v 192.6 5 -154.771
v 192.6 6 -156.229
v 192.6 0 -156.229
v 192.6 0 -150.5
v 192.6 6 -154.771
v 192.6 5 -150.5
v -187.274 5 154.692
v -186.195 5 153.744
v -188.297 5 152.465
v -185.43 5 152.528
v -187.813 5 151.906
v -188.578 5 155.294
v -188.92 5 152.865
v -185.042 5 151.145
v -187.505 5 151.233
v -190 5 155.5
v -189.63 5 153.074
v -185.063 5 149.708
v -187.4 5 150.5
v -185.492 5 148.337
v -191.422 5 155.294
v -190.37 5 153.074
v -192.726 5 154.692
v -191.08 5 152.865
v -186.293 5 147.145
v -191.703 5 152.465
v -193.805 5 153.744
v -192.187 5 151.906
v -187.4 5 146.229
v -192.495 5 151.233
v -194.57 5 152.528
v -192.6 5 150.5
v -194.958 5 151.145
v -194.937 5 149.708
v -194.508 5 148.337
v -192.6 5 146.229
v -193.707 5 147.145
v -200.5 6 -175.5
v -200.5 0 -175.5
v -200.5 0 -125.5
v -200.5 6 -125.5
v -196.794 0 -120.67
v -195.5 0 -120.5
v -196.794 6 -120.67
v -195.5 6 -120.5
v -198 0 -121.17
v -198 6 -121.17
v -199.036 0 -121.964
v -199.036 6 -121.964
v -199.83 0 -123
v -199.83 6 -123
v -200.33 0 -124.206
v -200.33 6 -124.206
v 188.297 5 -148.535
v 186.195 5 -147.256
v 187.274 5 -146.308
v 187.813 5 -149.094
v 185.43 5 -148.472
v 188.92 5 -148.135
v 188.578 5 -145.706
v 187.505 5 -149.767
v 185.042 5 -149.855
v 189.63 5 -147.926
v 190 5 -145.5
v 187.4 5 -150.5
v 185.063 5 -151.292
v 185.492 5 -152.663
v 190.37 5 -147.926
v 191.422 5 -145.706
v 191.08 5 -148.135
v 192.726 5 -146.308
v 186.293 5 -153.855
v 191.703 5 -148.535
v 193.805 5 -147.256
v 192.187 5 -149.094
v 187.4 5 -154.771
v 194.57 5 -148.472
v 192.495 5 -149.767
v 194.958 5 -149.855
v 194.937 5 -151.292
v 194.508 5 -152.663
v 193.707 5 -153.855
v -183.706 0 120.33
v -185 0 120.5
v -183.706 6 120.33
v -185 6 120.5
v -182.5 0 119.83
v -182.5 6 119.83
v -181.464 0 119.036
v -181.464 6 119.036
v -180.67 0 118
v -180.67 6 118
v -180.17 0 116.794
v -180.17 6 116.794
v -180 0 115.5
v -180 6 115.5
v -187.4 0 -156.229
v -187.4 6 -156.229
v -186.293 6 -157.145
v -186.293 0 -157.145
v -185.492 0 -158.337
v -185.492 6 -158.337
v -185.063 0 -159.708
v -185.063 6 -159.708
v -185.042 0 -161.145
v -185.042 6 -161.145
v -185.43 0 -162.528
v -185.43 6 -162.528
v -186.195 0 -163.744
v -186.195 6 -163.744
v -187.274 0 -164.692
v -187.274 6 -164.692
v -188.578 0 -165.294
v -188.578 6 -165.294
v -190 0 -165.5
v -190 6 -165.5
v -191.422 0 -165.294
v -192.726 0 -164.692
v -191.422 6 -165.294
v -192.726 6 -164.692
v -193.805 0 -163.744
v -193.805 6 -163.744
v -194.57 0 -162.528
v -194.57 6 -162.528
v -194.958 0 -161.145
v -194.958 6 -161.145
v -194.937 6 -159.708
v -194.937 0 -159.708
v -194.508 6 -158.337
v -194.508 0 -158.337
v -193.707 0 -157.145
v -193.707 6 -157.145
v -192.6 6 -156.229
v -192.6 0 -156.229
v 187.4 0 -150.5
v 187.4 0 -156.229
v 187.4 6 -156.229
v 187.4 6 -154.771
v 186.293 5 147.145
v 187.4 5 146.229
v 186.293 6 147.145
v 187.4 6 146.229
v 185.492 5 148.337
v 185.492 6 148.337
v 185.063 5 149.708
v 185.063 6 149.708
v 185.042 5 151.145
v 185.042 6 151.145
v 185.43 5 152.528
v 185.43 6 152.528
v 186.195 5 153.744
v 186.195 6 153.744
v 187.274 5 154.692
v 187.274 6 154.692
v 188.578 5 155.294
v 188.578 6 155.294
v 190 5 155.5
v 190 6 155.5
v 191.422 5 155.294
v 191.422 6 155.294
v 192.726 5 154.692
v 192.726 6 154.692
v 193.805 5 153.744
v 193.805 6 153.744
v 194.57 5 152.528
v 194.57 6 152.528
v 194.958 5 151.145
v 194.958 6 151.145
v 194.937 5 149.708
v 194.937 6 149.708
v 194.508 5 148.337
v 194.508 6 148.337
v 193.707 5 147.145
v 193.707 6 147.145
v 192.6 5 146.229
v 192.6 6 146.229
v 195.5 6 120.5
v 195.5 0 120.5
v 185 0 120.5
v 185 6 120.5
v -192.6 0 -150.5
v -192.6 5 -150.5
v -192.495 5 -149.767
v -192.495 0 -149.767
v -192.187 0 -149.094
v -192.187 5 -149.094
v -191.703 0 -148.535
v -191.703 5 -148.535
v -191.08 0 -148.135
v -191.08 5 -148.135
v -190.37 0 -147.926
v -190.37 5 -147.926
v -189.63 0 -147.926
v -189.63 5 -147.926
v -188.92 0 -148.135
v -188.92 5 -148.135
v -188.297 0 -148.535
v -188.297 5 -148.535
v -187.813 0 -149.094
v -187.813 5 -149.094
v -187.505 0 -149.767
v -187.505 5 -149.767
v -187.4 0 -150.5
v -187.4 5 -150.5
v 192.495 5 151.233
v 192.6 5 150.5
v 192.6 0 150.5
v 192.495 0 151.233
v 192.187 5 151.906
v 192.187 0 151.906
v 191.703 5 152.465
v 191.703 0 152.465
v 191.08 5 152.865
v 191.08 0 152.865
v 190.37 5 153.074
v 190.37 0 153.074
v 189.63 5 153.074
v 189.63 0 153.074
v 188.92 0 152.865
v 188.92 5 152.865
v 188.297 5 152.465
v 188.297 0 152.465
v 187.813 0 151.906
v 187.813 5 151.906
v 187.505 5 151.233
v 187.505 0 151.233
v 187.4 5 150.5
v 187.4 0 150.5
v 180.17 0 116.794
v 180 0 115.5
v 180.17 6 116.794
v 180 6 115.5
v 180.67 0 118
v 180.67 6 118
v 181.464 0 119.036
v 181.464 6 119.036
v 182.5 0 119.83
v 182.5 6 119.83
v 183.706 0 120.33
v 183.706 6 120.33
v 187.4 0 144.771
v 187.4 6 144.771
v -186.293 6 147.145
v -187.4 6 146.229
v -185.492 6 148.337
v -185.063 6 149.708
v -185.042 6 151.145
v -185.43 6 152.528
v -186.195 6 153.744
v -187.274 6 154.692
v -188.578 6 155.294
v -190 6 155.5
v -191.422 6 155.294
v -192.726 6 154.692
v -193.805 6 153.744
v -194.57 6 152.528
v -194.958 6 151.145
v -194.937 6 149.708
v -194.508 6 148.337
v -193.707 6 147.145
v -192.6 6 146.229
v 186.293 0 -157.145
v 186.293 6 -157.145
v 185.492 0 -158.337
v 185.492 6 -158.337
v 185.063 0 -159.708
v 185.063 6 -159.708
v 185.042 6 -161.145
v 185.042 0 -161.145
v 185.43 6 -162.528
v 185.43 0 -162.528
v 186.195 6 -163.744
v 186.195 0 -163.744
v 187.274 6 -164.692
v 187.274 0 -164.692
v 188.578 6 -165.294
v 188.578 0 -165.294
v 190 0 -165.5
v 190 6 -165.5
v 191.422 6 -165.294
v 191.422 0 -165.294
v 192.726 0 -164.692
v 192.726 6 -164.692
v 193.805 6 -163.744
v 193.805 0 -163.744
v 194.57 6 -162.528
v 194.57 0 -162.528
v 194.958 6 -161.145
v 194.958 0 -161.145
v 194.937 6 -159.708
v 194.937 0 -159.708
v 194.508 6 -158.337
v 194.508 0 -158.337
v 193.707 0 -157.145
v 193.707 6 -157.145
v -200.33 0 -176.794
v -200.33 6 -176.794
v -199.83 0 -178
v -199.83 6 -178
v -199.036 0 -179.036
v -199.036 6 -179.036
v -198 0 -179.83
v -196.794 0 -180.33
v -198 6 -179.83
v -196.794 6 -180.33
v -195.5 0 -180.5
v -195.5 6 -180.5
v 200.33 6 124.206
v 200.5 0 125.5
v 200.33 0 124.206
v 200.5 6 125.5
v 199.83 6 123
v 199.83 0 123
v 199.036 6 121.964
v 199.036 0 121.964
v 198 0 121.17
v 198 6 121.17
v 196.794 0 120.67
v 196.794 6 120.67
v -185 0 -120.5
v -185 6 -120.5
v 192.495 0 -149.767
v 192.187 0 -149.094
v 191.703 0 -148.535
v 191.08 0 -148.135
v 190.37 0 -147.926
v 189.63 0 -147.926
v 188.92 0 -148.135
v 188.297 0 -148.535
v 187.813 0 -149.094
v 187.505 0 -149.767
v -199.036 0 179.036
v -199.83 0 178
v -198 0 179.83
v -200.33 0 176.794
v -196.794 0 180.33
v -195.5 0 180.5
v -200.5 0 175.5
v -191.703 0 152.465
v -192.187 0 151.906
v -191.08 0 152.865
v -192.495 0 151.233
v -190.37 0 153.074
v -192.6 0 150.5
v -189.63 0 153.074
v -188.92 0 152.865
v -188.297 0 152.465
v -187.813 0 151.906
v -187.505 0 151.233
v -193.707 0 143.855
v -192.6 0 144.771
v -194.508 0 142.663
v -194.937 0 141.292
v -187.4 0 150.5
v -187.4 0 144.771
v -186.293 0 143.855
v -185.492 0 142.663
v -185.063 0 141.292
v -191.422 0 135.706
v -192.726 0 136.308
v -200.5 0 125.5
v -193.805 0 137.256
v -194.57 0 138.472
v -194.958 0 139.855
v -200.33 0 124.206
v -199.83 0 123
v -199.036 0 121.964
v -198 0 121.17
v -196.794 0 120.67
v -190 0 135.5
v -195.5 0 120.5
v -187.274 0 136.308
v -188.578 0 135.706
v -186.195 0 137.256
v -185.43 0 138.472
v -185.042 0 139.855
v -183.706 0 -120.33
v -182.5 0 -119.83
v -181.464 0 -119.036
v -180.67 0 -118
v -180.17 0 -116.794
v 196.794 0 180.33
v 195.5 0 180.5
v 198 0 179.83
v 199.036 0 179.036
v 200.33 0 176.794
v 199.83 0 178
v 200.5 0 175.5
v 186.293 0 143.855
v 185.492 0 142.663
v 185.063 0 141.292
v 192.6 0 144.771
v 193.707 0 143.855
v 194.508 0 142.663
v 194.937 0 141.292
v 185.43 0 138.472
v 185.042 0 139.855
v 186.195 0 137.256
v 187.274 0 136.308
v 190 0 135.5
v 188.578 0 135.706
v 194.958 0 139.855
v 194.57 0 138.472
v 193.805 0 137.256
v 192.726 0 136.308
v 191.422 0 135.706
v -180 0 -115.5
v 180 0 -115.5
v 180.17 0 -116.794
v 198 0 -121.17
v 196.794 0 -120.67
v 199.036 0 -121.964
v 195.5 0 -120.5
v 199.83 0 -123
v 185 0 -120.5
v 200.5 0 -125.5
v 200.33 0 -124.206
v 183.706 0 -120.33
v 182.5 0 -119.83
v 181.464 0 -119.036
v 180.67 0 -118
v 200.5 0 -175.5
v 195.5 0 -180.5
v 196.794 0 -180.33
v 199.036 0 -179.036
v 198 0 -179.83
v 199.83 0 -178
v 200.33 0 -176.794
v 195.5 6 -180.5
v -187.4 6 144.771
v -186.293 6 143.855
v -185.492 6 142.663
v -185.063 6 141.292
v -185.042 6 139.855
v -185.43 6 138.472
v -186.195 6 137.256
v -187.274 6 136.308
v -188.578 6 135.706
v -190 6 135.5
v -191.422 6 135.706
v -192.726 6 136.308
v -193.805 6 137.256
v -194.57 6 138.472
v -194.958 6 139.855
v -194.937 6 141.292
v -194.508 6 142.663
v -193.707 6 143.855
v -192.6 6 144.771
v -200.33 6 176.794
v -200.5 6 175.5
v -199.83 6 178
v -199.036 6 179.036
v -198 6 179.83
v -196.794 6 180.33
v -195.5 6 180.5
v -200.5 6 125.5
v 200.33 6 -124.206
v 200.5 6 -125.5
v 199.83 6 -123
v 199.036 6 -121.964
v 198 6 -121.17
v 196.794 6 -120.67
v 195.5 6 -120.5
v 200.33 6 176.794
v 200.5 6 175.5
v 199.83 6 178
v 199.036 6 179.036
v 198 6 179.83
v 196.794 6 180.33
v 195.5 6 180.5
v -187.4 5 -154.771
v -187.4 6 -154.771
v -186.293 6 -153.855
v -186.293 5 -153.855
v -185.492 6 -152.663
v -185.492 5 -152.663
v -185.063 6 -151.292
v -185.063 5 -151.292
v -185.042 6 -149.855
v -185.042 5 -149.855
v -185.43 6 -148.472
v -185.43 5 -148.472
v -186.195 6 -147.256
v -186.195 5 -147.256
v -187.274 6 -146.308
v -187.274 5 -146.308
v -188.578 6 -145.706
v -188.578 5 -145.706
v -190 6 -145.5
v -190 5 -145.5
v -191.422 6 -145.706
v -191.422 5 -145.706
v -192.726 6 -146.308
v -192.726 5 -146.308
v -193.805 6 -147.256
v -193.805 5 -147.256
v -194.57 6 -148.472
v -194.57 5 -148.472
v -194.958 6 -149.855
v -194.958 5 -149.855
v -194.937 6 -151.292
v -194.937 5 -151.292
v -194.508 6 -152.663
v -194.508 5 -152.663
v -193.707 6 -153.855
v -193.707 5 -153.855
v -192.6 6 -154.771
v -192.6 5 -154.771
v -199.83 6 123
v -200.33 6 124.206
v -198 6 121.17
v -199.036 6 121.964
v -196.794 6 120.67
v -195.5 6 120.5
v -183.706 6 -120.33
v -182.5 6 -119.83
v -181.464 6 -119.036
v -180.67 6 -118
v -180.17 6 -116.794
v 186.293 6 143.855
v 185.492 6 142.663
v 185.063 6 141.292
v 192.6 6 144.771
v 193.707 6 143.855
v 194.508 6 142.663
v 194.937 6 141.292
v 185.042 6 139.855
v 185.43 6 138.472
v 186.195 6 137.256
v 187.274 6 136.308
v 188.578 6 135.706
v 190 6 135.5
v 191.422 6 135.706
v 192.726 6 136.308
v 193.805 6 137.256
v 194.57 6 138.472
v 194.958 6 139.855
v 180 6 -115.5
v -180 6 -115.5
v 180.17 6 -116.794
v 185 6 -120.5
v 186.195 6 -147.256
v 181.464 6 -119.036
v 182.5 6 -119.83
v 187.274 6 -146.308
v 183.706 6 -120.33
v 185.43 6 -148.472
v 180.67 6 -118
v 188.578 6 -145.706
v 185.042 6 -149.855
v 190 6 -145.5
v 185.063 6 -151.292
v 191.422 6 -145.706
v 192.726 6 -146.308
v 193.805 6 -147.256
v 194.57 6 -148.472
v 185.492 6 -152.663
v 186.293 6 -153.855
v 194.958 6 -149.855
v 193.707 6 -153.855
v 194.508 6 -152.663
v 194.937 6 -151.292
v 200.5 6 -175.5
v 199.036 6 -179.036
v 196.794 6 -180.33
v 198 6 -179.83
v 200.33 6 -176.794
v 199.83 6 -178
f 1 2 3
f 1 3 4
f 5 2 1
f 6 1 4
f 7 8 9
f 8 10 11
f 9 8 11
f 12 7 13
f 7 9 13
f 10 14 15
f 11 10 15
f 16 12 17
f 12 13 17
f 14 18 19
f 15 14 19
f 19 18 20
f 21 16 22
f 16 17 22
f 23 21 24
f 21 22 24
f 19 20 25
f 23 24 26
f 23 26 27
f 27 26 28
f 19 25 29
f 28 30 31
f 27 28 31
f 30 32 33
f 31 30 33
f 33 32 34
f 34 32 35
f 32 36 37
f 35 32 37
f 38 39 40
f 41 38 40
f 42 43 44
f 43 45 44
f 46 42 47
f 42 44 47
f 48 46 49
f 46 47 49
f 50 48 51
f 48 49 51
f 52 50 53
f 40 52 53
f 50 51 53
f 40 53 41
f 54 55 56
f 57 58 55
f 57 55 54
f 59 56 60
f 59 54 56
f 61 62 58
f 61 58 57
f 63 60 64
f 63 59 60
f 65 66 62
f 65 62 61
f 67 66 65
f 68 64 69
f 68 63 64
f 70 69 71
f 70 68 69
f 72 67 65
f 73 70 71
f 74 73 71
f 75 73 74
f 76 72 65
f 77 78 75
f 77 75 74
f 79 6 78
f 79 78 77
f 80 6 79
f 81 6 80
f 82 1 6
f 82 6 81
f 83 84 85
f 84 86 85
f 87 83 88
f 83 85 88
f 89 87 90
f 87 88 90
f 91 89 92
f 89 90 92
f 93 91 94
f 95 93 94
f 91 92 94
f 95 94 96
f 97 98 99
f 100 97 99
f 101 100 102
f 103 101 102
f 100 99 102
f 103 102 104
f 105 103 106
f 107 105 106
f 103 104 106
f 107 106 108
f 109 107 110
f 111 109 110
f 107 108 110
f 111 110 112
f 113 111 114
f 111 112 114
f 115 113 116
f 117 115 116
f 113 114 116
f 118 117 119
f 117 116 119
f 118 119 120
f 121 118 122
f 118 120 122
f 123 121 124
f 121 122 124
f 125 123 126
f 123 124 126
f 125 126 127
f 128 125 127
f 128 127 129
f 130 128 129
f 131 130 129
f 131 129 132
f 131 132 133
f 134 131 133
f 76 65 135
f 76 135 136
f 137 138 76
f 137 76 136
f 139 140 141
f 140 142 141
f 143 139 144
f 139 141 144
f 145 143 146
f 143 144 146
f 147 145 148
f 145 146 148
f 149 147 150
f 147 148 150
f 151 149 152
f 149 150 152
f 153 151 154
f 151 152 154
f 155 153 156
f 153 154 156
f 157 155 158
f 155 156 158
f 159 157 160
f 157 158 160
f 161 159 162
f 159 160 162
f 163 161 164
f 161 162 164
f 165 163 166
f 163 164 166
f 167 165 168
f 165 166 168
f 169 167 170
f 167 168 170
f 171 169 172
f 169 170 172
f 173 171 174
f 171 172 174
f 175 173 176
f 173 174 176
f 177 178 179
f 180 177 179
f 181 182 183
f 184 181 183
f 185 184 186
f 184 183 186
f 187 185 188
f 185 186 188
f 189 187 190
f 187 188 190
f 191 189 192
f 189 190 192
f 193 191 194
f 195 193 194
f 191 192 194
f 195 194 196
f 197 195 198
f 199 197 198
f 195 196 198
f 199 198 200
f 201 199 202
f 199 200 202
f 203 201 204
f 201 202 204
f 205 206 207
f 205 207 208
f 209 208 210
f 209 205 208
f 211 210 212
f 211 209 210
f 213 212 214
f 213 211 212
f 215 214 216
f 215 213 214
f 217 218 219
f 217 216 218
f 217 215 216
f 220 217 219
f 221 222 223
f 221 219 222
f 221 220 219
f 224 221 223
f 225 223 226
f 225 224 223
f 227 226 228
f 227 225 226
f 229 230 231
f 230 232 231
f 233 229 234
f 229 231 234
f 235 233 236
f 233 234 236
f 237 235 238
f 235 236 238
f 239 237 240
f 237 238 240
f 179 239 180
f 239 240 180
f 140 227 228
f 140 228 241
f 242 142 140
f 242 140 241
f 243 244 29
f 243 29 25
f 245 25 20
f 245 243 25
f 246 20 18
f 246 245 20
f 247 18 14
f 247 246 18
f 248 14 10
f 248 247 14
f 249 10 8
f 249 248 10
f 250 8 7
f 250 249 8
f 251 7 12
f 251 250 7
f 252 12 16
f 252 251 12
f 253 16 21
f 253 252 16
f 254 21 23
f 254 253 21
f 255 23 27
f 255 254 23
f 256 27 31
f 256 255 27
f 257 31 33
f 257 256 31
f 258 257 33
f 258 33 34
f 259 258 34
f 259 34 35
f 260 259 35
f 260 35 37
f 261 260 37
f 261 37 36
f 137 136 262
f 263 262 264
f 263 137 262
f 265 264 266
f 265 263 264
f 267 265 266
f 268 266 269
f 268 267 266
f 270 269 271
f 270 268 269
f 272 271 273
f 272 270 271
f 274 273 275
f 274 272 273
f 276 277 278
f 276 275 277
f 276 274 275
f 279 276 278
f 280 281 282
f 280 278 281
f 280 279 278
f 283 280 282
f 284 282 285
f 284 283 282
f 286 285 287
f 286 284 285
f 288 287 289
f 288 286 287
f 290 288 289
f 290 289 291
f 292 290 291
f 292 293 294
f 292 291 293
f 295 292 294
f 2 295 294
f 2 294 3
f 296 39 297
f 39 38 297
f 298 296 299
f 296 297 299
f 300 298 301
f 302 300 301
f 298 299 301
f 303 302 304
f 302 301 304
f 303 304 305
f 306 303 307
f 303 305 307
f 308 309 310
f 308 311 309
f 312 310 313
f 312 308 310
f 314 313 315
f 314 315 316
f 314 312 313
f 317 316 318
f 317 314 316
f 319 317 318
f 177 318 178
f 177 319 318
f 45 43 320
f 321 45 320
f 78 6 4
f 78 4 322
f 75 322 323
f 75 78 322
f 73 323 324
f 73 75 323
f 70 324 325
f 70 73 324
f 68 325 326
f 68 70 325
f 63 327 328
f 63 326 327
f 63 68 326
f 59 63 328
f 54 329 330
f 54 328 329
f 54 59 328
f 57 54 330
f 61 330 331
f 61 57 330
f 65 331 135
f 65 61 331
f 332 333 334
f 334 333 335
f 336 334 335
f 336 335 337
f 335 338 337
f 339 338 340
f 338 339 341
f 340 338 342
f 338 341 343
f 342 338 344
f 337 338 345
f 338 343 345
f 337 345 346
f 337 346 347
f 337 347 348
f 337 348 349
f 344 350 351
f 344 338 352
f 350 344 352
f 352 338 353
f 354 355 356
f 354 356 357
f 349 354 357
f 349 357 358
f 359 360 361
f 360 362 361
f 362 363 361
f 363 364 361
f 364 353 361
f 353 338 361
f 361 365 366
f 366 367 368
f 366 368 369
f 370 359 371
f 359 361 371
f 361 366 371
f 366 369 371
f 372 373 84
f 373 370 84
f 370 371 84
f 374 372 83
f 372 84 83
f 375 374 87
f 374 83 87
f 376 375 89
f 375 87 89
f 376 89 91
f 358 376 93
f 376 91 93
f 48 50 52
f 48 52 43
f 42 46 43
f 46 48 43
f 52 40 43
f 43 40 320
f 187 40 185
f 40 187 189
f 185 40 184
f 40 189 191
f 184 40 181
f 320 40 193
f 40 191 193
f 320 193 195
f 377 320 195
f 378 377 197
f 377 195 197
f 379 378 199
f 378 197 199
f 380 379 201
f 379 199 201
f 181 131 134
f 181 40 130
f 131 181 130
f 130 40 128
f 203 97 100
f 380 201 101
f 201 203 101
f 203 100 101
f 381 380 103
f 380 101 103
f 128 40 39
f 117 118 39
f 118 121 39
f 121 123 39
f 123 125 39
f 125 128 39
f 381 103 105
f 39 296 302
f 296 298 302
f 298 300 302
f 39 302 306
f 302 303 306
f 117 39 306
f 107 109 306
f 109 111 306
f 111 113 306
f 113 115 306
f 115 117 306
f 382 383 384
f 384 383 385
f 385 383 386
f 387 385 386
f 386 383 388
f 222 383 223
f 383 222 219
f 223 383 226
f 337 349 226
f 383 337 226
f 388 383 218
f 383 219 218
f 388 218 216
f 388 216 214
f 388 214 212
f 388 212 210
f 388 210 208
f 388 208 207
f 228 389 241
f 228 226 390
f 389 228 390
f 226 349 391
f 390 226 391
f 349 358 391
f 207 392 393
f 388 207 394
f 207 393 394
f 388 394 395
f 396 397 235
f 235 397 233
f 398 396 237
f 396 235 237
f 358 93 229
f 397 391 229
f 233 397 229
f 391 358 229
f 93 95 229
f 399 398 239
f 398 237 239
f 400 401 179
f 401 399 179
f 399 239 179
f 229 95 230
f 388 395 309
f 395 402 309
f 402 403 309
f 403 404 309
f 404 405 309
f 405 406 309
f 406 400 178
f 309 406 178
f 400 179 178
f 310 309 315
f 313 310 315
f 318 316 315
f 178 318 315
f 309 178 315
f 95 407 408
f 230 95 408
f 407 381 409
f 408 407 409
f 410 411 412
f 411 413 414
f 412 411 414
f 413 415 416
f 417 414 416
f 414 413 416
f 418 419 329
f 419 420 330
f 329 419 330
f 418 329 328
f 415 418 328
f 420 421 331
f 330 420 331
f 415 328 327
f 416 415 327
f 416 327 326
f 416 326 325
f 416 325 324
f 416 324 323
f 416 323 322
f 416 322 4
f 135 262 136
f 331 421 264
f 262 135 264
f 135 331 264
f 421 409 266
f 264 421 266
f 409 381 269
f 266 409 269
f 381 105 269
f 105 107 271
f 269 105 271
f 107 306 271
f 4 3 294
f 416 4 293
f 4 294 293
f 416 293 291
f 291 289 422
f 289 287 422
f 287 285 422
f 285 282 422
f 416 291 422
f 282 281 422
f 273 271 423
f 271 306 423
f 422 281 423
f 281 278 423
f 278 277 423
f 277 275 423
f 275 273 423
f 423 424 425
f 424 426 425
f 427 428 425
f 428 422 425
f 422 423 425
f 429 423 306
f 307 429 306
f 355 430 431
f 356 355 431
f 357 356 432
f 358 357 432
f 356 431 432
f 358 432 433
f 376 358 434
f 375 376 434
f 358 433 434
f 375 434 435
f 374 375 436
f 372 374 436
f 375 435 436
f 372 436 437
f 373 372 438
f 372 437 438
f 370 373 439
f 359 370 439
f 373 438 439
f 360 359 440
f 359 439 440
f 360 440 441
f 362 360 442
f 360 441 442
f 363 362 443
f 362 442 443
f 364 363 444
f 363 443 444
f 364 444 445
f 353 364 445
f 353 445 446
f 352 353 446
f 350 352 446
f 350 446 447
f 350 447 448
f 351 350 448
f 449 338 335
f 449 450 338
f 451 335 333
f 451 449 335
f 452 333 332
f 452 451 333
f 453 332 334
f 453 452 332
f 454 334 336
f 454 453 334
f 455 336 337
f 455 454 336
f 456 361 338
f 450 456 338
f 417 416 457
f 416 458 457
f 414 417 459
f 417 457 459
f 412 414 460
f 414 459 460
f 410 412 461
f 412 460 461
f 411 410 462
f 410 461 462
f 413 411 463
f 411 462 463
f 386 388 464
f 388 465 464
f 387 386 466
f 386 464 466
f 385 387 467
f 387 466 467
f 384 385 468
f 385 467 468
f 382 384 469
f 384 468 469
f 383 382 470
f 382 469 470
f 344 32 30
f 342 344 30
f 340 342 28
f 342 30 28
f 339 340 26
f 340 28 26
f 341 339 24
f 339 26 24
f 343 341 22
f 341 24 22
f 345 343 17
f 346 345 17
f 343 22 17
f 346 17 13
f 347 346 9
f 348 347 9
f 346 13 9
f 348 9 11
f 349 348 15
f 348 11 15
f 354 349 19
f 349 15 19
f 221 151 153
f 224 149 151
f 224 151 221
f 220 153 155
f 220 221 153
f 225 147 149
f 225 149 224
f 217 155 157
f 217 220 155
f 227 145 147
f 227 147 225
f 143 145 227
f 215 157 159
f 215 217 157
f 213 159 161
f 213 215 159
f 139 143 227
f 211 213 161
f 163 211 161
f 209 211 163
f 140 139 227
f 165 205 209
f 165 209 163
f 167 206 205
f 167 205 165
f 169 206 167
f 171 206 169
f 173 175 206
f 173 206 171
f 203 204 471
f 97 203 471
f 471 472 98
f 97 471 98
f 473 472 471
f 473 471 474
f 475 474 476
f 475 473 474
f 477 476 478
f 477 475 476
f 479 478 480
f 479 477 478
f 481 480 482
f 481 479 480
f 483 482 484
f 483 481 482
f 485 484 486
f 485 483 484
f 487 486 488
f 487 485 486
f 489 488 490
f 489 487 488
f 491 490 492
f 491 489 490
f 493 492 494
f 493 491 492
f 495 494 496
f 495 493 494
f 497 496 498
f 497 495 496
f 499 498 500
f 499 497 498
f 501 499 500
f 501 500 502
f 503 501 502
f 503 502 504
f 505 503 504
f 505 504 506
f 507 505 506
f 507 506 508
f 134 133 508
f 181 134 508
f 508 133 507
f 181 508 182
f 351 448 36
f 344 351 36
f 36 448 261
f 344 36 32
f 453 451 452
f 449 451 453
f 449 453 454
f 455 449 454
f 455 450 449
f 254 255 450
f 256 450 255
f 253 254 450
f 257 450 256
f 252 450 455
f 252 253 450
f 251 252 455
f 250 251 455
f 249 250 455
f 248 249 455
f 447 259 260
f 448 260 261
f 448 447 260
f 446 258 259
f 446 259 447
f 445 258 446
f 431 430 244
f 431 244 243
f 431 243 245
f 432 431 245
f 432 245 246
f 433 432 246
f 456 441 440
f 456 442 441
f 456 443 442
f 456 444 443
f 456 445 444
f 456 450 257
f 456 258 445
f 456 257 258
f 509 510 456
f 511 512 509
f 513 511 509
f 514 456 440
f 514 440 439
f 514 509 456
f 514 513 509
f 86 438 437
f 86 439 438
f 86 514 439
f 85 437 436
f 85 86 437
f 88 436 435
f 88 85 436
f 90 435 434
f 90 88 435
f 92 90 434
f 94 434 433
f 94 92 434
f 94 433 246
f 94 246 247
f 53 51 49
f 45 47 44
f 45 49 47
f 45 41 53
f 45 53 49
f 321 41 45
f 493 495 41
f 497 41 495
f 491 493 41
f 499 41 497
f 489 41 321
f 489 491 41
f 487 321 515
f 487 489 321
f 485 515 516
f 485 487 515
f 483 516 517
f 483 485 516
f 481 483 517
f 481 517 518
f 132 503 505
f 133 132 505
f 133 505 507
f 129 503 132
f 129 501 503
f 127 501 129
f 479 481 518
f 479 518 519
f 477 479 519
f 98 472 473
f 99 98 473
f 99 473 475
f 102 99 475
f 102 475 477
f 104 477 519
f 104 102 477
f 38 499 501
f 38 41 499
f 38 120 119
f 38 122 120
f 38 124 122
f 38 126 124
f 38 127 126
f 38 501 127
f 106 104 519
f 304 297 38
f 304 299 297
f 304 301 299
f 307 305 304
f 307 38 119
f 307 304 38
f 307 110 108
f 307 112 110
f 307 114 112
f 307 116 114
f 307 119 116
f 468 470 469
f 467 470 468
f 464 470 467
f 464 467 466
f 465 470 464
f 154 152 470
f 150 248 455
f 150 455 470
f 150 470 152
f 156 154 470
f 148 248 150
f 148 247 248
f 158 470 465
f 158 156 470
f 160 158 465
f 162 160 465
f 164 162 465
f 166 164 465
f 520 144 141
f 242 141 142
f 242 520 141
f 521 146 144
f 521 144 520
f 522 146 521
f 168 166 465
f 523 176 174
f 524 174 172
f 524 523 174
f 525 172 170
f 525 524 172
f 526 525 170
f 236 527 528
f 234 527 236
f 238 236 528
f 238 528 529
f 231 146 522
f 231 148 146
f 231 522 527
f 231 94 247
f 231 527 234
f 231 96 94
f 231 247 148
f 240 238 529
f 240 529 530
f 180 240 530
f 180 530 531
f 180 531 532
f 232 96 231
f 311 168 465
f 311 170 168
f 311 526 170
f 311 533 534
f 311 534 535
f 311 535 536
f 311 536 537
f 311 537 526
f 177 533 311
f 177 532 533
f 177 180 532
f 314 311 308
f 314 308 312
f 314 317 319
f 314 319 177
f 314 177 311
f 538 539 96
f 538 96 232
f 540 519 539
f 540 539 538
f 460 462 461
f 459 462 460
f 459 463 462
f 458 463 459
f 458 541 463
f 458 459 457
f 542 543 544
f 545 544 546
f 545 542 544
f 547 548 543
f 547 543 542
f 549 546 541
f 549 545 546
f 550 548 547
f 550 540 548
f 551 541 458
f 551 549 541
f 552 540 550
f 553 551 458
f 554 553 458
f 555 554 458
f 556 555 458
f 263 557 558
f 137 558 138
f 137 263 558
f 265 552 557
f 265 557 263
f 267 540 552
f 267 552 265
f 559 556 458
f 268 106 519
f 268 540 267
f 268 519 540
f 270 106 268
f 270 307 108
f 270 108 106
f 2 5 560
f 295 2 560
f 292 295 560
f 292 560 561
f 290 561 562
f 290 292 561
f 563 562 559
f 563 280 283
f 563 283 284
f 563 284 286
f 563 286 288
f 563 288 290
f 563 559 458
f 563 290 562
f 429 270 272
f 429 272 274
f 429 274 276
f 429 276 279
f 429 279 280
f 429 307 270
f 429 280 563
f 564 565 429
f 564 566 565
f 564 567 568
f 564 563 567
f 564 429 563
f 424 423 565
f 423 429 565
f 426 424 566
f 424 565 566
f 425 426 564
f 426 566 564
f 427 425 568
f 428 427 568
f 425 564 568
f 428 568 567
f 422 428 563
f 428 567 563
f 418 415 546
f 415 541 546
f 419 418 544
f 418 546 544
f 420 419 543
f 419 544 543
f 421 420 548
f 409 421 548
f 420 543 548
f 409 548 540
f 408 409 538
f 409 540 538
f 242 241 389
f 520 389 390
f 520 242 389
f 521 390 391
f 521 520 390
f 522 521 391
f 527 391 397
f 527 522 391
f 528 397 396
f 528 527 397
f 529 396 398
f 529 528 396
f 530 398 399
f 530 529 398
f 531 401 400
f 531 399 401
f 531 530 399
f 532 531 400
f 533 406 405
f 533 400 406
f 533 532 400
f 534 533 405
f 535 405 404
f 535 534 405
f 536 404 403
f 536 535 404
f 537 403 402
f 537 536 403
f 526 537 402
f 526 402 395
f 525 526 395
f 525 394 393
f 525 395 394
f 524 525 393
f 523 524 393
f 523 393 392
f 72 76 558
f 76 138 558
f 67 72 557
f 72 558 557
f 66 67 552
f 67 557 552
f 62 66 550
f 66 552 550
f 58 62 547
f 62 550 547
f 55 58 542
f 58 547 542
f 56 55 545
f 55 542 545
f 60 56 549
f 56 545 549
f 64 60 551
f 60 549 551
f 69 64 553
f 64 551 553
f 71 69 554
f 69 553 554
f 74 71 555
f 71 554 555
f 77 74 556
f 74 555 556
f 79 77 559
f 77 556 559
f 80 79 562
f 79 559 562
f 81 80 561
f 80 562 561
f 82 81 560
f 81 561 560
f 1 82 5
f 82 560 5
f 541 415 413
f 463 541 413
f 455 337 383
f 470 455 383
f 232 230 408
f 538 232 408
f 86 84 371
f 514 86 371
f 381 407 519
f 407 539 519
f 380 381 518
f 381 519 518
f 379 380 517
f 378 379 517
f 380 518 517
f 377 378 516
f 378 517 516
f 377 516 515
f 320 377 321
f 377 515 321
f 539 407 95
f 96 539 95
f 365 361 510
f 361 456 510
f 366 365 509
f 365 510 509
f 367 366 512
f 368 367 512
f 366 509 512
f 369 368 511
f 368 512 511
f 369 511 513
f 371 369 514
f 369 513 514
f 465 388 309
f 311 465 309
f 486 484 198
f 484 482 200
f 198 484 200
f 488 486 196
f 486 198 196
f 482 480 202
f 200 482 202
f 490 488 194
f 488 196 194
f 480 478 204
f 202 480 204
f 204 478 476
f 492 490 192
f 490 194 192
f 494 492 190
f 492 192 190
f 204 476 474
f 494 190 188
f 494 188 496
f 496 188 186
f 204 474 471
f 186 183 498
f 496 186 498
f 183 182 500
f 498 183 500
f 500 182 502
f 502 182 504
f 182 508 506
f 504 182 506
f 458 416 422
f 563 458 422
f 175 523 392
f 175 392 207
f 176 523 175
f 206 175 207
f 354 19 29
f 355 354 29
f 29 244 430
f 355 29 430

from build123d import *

# Parameters (mm, degrees)
BOSS_EXTRUDE1_DEPTH = 6
CUT_EXTRUDE1_DEPTH  = 270.845326067
SKETCH3_R           = 5
CUT_EXTRUDE2_DEPTH  = 1
FILLET1_R           = 5


with BuildPart() as part:
    # Sketch1 → Boss-Extrude1 (new body)
    with BuildSketch(Plane(origin=(0, 0, 0), x_dir=(1, 0, 0), z_dir=(0, 1, 0))):
        Polygon((0, -180.5), (200.5, -180.5), (200.5, -120.5), (180, -120.5), (180, 0), (180, 120.5), (200.5, 120.5), (200.5, 180.5), (0, 180.5), (-200.5, 180.5), (-200.5, 120.5), (-180, 120.5), (-180, 0), (-180, -120.5), (-200.5, -120.5), (-200.5, -180.5), align=None)
    extrude(amount=BOSS_EXTRUDE1_DEPTH)

    # Sketch2 → Cut-Extrude1 (cut, through all)
    with BuildSketch(Plane(origin=(0, 6, 0), x_dir=(1, 0, 0), z_dir=(0, 1, 0))):
        with BuildLine():
            Line((187.4, -150.5), (187.4, -144.770831301))
            ThreePointArc((187.4, -144.770831301), (190, -135.5), (192.6, -144.770831301))
            Line((192.6, -144.770831301), (192.6, -150.5))
            ThreePointArc((192.6, -150.5), (190, -153.1), (187.4, -150.5))
        make_face()
        with BuildLine():
            Line((187.4, 150.5), (187.4, 156.229168699))
            ThreePointArc((187.4, 156.229168699), (190, 165.5), (192.6, 156.229168699))
            Line((192.6, 156.229168699), (192.6, 150.5))
            ThreePointArc((192.6, 150.5), (190, 147.9), (187.4, 150.5))
        make_face()
    cut_extrude1 = extrude(amount=-CUT_EXTRUDE1_DEPTH, mode=Mode.SUBTRACT)

    # Sketch3 → Cut-Extrude2 (cut)
    with BuildSketch(Plane(origin=(0, 6, 0), x_dir=(1, 0, 0), z_dir=(0, 1, 0))):
        with Locations((190, 150.5)):
            Circle(SKETCH3_R)
        with Locations((190, -150.5)):
            Circle(SKETCH3_R)
    cut_extrude2 = extrude(amount=-CUT_EXTRUDE2_DEPTH, mode=Mode.SUBTRACT)

    # Mirror1: Cut-Extrude1, Cut-Extrude2 across plane
    add(cut_extrude1.mirror(Plane(origin=(0, 0, 0), x_dir=(0, 0, 1), z_dir=(1, 0, 0))), mode=Mode.SUBTRACT)
    add(cut_extrude2.mirror(Plane(origin=(0, 0, 0), x_dir=(0, 0, 1), z_dir=(1, 0, 0))), mode=Mode.SUBTRACT)

    # Fillet1
    fillet1_edges = [part.edges().sort_by_distance(p)[0] for p in [
        (-200.5, 3, 180.5),
        (-200.5, 3, 120.5),
        (-180, 3, 120.5),
        (-180, 3, -120.5),
        (-200.5, 3, -120.5),
        (-200.5, 3, -180.5),
        (200.5, 3, -180.5),
        (200.5, 3, -120.5),
        (180, 3, -120.5),
        (180, 3, 120.5),
        (200.5, 3, 120.5),
        (200.5, 3, 180.5),
    ]]
    fillet(fillet1_edges, radius=FILLET1_R)


solid = part.part
